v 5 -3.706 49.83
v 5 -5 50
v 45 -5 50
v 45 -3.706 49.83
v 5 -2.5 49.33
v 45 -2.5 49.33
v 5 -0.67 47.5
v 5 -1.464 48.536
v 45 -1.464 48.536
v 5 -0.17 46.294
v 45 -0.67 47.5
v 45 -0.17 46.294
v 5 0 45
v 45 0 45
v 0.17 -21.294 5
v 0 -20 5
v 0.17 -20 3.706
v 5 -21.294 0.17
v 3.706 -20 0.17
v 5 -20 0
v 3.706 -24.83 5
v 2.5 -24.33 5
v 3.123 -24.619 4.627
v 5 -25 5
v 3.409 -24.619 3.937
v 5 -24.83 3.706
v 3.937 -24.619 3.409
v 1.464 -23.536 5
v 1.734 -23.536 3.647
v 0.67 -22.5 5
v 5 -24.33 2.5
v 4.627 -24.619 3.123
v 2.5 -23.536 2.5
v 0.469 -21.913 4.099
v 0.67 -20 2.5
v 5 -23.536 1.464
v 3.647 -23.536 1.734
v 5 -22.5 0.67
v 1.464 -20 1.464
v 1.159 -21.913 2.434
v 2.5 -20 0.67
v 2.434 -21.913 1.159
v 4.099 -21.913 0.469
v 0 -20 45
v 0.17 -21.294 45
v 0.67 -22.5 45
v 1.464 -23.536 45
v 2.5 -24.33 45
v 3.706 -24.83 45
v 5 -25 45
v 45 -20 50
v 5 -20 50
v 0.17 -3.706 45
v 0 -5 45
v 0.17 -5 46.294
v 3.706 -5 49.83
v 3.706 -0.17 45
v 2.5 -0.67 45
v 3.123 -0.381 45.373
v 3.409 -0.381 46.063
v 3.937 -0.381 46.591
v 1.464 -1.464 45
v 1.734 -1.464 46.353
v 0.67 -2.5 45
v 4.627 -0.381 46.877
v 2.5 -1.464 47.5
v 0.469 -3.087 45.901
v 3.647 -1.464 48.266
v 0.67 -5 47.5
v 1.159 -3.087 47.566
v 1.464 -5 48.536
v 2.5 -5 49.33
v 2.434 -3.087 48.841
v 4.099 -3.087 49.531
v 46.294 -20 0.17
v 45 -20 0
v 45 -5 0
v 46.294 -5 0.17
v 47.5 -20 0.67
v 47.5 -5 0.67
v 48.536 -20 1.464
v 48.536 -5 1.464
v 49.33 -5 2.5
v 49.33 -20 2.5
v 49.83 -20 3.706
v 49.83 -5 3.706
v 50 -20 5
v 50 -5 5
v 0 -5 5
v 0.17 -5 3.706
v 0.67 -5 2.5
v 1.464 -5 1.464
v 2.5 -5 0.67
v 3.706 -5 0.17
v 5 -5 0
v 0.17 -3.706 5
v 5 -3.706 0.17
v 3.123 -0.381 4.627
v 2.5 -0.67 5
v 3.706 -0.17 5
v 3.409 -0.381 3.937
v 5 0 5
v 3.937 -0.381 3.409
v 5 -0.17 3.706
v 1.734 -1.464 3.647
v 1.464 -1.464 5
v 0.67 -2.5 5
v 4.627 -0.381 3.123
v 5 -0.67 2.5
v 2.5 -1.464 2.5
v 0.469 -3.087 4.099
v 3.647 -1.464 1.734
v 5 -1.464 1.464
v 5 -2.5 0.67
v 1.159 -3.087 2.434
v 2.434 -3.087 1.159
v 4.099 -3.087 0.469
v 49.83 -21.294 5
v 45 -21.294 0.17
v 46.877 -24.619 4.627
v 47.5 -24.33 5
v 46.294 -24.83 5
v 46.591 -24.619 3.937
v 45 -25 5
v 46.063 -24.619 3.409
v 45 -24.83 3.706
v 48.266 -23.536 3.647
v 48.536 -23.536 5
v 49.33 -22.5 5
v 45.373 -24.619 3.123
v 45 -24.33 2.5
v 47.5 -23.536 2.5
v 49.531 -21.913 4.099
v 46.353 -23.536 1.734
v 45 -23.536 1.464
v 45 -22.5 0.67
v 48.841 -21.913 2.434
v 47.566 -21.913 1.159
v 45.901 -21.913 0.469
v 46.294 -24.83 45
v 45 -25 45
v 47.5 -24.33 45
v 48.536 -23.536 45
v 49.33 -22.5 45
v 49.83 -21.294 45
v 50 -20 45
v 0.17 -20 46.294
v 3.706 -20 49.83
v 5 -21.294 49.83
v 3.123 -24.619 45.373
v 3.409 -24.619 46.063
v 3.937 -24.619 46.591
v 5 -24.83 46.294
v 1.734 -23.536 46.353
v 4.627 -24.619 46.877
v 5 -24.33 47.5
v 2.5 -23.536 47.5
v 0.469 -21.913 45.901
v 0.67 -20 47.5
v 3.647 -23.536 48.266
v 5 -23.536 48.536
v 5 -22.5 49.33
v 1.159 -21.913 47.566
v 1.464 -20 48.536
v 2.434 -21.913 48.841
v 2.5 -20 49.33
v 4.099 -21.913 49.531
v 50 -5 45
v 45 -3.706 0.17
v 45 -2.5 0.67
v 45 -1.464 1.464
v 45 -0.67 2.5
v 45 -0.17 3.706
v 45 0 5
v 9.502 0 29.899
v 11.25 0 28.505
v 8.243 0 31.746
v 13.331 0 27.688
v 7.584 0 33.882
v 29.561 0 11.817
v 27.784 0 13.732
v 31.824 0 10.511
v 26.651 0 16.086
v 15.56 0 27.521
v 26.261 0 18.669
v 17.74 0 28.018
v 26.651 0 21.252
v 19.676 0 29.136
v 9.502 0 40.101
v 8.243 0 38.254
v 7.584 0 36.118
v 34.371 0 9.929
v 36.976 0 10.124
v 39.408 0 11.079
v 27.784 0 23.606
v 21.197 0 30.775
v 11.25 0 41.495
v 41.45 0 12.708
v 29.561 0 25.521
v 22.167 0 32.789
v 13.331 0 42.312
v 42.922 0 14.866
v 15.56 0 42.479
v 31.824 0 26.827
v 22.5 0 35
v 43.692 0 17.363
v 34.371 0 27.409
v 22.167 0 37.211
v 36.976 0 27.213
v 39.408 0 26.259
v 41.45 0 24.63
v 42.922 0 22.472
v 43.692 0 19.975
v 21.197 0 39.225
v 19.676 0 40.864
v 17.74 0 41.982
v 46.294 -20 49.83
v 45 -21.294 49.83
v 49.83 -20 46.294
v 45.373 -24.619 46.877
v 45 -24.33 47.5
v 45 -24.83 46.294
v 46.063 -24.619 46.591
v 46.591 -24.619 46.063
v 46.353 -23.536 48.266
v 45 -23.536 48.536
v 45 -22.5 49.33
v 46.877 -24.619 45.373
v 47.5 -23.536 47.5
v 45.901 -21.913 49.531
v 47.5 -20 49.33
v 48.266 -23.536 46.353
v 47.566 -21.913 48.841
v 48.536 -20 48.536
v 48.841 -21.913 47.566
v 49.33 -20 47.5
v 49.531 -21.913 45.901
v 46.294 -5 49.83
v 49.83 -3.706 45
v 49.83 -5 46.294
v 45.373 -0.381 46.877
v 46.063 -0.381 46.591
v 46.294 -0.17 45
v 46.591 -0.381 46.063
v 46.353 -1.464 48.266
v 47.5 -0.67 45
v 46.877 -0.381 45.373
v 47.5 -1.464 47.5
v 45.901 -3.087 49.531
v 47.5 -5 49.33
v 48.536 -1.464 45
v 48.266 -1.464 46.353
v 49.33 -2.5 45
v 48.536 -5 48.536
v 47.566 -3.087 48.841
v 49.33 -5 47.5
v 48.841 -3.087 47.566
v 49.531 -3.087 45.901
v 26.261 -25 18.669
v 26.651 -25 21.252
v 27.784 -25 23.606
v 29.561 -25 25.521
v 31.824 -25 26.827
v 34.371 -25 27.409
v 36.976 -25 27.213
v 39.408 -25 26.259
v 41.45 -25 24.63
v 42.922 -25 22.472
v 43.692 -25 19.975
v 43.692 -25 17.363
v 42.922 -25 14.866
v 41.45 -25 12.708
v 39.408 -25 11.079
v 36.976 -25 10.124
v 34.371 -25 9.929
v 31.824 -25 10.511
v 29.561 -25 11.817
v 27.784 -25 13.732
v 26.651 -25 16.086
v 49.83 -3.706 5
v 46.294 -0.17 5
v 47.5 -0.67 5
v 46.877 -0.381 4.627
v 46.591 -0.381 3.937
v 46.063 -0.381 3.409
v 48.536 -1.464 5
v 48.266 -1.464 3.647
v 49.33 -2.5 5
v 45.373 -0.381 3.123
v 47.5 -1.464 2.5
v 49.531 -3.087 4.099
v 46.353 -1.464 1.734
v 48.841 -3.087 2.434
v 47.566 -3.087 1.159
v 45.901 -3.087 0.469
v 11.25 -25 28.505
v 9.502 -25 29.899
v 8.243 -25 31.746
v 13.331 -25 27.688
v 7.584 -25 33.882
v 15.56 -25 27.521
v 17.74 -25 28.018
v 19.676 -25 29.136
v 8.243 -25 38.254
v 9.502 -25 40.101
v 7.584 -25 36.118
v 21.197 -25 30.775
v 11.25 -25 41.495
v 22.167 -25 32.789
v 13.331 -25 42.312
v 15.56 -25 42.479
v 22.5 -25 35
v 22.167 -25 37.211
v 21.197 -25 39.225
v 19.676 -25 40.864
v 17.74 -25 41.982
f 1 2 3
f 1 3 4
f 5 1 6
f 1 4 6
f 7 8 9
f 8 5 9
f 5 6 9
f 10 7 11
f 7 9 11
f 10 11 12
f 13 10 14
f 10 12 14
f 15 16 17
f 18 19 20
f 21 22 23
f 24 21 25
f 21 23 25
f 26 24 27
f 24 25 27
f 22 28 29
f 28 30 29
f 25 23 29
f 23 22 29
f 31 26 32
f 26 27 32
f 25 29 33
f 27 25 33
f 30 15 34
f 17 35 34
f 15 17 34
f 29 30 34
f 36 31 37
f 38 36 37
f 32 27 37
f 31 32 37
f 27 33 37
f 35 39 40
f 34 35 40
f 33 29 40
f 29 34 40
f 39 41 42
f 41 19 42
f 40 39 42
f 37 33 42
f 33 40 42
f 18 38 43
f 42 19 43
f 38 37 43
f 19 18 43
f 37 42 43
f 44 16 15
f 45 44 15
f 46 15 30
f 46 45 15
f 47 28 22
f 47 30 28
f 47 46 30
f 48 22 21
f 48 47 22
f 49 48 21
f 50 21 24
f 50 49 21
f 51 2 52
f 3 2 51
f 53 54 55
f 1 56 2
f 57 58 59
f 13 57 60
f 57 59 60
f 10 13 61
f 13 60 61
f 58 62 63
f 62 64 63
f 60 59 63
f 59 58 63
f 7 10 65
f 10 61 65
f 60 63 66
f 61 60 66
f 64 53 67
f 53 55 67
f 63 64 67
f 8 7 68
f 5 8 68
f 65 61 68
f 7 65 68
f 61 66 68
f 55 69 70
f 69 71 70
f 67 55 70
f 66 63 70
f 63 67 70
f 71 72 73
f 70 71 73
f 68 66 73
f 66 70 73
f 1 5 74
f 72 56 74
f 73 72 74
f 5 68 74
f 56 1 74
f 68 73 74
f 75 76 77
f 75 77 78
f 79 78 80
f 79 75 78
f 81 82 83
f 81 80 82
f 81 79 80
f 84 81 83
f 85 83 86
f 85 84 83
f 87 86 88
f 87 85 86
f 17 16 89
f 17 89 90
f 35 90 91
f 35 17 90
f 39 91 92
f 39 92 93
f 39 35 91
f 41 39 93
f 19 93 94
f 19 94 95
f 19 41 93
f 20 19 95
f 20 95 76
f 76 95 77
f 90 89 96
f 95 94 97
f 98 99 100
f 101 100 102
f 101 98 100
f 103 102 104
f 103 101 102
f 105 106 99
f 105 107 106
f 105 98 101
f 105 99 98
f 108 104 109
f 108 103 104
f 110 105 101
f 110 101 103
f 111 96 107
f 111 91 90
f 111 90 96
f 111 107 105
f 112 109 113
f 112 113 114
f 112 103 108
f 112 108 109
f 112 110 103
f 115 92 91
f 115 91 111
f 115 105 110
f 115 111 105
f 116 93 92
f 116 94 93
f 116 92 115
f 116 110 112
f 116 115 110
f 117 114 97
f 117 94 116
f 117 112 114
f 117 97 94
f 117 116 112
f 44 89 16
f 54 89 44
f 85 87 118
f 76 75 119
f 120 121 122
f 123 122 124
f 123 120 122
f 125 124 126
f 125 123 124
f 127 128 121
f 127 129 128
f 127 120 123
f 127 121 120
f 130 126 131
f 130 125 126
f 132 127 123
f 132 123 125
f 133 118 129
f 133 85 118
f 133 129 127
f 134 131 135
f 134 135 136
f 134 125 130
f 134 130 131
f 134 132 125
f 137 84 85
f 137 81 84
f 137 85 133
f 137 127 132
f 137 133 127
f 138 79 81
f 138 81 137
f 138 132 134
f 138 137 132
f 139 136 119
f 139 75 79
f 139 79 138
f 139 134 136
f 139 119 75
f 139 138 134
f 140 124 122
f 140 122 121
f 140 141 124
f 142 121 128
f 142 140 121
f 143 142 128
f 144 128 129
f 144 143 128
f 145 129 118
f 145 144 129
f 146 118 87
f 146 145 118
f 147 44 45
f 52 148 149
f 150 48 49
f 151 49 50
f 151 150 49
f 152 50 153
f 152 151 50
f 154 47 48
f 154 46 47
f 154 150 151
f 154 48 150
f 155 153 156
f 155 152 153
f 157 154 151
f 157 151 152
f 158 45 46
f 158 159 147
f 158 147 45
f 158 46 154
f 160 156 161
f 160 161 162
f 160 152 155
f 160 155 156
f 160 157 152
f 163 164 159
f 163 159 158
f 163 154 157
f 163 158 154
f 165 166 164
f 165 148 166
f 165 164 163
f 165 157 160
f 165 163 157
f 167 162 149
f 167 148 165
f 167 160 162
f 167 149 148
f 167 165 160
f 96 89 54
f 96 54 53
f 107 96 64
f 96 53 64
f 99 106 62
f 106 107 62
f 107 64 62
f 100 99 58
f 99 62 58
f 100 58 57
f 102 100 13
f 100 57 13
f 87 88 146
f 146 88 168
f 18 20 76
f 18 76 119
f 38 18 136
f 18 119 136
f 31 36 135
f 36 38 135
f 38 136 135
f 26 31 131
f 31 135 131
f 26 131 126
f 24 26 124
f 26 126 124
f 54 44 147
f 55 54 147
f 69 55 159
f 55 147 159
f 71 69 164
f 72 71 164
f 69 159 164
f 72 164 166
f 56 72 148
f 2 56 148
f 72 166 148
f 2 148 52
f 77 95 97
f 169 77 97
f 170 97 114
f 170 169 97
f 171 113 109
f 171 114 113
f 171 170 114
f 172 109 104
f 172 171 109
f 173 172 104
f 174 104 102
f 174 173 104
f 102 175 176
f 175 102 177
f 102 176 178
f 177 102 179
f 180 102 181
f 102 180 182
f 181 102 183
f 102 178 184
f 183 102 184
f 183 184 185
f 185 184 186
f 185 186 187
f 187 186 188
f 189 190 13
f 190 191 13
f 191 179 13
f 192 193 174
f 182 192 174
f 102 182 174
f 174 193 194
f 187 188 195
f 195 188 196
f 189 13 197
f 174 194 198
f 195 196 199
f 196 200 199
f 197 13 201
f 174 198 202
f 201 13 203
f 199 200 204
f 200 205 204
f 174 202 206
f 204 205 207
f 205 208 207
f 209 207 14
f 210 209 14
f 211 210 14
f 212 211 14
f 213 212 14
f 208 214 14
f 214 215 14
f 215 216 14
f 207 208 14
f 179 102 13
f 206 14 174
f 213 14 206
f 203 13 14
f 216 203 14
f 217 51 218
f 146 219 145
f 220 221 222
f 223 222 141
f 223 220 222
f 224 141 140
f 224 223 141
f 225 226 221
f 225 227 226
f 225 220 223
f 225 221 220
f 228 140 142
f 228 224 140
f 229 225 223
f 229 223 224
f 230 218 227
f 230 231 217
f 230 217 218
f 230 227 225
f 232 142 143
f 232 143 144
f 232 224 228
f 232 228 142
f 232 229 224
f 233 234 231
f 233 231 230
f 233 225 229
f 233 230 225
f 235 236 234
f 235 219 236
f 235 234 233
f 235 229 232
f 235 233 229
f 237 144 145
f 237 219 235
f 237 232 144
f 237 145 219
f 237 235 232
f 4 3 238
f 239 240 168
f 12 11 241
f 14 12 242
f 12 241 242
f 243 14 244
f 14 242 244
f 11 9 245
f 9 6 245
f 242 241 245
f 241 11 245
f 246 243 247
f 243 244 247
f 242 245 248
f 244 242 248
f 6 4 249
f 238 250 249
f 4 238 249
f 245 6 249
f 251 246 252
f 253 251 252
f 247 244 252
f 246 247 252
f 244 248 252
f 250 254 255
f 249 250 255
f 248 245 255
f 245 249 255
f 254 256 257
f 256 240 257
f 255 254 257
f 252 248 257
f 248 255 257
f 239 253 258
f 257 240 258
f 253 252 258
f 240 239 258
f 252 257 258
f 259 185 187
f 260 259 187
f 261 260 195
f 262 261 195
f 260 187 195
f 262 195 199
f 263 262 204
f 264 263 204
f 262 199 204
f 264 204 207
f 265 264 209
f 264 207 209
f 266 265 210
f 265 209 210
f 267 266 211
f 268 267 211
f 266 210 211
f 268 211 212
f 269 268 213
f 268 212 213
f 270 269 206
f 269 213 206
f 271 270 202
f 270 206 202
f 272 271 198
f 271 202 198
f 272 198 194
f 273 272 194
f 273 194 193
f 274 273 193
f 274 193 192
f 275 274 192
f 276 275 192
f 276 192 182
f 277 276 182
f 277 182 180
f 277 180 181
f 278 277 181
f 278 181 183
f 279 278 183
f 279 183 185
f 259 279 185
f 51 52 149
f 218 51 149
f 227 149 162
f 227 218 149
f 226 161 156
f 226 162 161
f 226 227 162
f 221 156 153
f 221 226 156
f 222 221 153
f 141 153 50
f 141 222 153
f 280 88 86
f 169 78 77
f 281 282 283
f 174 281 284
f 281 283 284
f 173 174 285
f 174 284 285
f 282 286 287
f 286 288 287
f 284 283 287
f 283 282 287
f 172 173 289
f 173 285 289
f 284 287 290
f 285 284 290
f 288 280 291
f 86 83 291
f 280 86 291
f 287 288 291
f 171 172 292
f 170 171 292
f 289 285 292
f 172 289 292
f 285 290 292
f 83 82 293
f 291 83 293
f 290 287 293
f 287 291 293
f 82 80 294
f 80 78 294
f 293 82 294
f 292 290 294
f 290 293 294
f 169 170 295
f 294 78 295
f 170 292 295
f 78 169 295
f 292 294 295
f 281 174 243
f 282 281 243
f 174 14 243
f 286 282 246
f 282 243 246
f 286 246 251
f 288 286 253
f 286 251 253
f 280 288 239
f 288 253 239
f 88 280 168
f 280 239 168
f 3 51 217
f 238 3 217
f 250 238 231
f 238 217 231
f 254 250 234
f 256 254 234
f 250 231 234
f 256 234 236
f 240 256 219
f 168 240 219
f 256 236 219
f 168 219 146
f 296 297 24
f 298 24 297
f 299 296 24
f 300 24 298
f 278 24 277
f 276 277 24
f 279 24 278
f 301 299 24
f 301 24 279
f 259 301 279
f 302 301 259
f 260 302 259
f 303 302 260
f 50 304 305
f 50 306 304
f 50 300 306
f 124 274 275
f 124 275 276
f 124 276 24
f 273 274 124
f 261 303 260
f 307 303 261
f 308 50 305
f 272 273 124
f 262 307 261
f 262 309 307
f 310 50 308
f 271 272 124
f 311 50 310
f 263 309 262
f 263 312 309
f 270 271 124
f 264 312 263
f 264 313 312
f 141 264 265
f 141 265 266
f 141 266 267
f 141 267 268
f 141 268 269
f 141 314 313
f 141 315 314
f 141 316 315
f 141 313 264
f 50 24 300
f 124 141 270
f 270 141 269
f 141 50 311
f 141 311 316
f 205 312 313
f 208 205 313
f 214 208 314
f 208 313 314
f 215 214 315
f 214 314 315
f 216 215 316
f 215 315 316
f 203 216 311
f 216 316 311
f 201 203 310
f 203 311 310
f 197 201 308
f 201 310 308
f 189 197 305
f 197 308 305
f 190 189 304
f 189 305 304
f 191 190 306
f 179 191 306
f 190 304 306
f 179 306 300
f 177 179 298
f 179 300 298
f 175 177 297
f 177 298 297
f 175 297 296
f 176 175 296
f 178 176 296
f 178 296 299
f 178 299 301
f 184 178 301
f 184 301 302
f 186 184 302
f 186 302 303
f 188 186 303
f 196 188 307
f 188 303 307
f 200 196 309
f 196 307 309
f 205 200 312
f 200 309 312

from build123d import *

# Parameters (mm, degrees)
F0_W     = 50
F0_H     = 50
F1_DEPTH = 25
F2_R     = 7.5
F3_DEPTH = 25
F4_R     = 5
F5_R     = 8.7642434369
F6_DEPTH = 25.001


with BuildPart() as f1:
    # F0 (on Front) → F1 (new body)
    with BuildSketch(Plane.XZ):
        with Locations((25, 25)):
            Rectangle(F0_W, F0_H)
    extrude(amount=F1_DEPTH)

    # F2 (on face) → F3 (cut)
    with BuildSketch(Plane.XZ.offset(25)):
        with Locations((15, 35)):
            Circle(F2_R)
    extrude(amount=-F3_DEPTH, mode=Mode.SUBTRACT)

    # F4
    f4_edges = [f1.edges().sort_by_distance(p)[0] for p in [
        (0, -12.5, 50),
        (0, -12.5, 0),
        (0, 0, 25),
        (0, -25, 25),
        (50, -12.5, 50),
        (25, 0, 50),
        (25, -25, 50),
        (50, -12.5, 0),
        (50, 0, 25),
        (50, -25, 25),
        (25, 0, 0),
        (25, -25, 0),
    ]]
    fillet(f4_edges, radius=F4_R)

    # F5 (on face) → F6 (cut, through all)
    with BuildSketch(Plane(origin=(0, 0, 0), x_dir=(-1, 0, 0), z_dir=(0, 1, 0))):
        with Locations((-35.0254848599, 18.6689179391)):
            Circle(F5_R)
    extrude(amount=-F6_DEPTH, mode=Mode.SUBTRACT)


solid = f1.part
